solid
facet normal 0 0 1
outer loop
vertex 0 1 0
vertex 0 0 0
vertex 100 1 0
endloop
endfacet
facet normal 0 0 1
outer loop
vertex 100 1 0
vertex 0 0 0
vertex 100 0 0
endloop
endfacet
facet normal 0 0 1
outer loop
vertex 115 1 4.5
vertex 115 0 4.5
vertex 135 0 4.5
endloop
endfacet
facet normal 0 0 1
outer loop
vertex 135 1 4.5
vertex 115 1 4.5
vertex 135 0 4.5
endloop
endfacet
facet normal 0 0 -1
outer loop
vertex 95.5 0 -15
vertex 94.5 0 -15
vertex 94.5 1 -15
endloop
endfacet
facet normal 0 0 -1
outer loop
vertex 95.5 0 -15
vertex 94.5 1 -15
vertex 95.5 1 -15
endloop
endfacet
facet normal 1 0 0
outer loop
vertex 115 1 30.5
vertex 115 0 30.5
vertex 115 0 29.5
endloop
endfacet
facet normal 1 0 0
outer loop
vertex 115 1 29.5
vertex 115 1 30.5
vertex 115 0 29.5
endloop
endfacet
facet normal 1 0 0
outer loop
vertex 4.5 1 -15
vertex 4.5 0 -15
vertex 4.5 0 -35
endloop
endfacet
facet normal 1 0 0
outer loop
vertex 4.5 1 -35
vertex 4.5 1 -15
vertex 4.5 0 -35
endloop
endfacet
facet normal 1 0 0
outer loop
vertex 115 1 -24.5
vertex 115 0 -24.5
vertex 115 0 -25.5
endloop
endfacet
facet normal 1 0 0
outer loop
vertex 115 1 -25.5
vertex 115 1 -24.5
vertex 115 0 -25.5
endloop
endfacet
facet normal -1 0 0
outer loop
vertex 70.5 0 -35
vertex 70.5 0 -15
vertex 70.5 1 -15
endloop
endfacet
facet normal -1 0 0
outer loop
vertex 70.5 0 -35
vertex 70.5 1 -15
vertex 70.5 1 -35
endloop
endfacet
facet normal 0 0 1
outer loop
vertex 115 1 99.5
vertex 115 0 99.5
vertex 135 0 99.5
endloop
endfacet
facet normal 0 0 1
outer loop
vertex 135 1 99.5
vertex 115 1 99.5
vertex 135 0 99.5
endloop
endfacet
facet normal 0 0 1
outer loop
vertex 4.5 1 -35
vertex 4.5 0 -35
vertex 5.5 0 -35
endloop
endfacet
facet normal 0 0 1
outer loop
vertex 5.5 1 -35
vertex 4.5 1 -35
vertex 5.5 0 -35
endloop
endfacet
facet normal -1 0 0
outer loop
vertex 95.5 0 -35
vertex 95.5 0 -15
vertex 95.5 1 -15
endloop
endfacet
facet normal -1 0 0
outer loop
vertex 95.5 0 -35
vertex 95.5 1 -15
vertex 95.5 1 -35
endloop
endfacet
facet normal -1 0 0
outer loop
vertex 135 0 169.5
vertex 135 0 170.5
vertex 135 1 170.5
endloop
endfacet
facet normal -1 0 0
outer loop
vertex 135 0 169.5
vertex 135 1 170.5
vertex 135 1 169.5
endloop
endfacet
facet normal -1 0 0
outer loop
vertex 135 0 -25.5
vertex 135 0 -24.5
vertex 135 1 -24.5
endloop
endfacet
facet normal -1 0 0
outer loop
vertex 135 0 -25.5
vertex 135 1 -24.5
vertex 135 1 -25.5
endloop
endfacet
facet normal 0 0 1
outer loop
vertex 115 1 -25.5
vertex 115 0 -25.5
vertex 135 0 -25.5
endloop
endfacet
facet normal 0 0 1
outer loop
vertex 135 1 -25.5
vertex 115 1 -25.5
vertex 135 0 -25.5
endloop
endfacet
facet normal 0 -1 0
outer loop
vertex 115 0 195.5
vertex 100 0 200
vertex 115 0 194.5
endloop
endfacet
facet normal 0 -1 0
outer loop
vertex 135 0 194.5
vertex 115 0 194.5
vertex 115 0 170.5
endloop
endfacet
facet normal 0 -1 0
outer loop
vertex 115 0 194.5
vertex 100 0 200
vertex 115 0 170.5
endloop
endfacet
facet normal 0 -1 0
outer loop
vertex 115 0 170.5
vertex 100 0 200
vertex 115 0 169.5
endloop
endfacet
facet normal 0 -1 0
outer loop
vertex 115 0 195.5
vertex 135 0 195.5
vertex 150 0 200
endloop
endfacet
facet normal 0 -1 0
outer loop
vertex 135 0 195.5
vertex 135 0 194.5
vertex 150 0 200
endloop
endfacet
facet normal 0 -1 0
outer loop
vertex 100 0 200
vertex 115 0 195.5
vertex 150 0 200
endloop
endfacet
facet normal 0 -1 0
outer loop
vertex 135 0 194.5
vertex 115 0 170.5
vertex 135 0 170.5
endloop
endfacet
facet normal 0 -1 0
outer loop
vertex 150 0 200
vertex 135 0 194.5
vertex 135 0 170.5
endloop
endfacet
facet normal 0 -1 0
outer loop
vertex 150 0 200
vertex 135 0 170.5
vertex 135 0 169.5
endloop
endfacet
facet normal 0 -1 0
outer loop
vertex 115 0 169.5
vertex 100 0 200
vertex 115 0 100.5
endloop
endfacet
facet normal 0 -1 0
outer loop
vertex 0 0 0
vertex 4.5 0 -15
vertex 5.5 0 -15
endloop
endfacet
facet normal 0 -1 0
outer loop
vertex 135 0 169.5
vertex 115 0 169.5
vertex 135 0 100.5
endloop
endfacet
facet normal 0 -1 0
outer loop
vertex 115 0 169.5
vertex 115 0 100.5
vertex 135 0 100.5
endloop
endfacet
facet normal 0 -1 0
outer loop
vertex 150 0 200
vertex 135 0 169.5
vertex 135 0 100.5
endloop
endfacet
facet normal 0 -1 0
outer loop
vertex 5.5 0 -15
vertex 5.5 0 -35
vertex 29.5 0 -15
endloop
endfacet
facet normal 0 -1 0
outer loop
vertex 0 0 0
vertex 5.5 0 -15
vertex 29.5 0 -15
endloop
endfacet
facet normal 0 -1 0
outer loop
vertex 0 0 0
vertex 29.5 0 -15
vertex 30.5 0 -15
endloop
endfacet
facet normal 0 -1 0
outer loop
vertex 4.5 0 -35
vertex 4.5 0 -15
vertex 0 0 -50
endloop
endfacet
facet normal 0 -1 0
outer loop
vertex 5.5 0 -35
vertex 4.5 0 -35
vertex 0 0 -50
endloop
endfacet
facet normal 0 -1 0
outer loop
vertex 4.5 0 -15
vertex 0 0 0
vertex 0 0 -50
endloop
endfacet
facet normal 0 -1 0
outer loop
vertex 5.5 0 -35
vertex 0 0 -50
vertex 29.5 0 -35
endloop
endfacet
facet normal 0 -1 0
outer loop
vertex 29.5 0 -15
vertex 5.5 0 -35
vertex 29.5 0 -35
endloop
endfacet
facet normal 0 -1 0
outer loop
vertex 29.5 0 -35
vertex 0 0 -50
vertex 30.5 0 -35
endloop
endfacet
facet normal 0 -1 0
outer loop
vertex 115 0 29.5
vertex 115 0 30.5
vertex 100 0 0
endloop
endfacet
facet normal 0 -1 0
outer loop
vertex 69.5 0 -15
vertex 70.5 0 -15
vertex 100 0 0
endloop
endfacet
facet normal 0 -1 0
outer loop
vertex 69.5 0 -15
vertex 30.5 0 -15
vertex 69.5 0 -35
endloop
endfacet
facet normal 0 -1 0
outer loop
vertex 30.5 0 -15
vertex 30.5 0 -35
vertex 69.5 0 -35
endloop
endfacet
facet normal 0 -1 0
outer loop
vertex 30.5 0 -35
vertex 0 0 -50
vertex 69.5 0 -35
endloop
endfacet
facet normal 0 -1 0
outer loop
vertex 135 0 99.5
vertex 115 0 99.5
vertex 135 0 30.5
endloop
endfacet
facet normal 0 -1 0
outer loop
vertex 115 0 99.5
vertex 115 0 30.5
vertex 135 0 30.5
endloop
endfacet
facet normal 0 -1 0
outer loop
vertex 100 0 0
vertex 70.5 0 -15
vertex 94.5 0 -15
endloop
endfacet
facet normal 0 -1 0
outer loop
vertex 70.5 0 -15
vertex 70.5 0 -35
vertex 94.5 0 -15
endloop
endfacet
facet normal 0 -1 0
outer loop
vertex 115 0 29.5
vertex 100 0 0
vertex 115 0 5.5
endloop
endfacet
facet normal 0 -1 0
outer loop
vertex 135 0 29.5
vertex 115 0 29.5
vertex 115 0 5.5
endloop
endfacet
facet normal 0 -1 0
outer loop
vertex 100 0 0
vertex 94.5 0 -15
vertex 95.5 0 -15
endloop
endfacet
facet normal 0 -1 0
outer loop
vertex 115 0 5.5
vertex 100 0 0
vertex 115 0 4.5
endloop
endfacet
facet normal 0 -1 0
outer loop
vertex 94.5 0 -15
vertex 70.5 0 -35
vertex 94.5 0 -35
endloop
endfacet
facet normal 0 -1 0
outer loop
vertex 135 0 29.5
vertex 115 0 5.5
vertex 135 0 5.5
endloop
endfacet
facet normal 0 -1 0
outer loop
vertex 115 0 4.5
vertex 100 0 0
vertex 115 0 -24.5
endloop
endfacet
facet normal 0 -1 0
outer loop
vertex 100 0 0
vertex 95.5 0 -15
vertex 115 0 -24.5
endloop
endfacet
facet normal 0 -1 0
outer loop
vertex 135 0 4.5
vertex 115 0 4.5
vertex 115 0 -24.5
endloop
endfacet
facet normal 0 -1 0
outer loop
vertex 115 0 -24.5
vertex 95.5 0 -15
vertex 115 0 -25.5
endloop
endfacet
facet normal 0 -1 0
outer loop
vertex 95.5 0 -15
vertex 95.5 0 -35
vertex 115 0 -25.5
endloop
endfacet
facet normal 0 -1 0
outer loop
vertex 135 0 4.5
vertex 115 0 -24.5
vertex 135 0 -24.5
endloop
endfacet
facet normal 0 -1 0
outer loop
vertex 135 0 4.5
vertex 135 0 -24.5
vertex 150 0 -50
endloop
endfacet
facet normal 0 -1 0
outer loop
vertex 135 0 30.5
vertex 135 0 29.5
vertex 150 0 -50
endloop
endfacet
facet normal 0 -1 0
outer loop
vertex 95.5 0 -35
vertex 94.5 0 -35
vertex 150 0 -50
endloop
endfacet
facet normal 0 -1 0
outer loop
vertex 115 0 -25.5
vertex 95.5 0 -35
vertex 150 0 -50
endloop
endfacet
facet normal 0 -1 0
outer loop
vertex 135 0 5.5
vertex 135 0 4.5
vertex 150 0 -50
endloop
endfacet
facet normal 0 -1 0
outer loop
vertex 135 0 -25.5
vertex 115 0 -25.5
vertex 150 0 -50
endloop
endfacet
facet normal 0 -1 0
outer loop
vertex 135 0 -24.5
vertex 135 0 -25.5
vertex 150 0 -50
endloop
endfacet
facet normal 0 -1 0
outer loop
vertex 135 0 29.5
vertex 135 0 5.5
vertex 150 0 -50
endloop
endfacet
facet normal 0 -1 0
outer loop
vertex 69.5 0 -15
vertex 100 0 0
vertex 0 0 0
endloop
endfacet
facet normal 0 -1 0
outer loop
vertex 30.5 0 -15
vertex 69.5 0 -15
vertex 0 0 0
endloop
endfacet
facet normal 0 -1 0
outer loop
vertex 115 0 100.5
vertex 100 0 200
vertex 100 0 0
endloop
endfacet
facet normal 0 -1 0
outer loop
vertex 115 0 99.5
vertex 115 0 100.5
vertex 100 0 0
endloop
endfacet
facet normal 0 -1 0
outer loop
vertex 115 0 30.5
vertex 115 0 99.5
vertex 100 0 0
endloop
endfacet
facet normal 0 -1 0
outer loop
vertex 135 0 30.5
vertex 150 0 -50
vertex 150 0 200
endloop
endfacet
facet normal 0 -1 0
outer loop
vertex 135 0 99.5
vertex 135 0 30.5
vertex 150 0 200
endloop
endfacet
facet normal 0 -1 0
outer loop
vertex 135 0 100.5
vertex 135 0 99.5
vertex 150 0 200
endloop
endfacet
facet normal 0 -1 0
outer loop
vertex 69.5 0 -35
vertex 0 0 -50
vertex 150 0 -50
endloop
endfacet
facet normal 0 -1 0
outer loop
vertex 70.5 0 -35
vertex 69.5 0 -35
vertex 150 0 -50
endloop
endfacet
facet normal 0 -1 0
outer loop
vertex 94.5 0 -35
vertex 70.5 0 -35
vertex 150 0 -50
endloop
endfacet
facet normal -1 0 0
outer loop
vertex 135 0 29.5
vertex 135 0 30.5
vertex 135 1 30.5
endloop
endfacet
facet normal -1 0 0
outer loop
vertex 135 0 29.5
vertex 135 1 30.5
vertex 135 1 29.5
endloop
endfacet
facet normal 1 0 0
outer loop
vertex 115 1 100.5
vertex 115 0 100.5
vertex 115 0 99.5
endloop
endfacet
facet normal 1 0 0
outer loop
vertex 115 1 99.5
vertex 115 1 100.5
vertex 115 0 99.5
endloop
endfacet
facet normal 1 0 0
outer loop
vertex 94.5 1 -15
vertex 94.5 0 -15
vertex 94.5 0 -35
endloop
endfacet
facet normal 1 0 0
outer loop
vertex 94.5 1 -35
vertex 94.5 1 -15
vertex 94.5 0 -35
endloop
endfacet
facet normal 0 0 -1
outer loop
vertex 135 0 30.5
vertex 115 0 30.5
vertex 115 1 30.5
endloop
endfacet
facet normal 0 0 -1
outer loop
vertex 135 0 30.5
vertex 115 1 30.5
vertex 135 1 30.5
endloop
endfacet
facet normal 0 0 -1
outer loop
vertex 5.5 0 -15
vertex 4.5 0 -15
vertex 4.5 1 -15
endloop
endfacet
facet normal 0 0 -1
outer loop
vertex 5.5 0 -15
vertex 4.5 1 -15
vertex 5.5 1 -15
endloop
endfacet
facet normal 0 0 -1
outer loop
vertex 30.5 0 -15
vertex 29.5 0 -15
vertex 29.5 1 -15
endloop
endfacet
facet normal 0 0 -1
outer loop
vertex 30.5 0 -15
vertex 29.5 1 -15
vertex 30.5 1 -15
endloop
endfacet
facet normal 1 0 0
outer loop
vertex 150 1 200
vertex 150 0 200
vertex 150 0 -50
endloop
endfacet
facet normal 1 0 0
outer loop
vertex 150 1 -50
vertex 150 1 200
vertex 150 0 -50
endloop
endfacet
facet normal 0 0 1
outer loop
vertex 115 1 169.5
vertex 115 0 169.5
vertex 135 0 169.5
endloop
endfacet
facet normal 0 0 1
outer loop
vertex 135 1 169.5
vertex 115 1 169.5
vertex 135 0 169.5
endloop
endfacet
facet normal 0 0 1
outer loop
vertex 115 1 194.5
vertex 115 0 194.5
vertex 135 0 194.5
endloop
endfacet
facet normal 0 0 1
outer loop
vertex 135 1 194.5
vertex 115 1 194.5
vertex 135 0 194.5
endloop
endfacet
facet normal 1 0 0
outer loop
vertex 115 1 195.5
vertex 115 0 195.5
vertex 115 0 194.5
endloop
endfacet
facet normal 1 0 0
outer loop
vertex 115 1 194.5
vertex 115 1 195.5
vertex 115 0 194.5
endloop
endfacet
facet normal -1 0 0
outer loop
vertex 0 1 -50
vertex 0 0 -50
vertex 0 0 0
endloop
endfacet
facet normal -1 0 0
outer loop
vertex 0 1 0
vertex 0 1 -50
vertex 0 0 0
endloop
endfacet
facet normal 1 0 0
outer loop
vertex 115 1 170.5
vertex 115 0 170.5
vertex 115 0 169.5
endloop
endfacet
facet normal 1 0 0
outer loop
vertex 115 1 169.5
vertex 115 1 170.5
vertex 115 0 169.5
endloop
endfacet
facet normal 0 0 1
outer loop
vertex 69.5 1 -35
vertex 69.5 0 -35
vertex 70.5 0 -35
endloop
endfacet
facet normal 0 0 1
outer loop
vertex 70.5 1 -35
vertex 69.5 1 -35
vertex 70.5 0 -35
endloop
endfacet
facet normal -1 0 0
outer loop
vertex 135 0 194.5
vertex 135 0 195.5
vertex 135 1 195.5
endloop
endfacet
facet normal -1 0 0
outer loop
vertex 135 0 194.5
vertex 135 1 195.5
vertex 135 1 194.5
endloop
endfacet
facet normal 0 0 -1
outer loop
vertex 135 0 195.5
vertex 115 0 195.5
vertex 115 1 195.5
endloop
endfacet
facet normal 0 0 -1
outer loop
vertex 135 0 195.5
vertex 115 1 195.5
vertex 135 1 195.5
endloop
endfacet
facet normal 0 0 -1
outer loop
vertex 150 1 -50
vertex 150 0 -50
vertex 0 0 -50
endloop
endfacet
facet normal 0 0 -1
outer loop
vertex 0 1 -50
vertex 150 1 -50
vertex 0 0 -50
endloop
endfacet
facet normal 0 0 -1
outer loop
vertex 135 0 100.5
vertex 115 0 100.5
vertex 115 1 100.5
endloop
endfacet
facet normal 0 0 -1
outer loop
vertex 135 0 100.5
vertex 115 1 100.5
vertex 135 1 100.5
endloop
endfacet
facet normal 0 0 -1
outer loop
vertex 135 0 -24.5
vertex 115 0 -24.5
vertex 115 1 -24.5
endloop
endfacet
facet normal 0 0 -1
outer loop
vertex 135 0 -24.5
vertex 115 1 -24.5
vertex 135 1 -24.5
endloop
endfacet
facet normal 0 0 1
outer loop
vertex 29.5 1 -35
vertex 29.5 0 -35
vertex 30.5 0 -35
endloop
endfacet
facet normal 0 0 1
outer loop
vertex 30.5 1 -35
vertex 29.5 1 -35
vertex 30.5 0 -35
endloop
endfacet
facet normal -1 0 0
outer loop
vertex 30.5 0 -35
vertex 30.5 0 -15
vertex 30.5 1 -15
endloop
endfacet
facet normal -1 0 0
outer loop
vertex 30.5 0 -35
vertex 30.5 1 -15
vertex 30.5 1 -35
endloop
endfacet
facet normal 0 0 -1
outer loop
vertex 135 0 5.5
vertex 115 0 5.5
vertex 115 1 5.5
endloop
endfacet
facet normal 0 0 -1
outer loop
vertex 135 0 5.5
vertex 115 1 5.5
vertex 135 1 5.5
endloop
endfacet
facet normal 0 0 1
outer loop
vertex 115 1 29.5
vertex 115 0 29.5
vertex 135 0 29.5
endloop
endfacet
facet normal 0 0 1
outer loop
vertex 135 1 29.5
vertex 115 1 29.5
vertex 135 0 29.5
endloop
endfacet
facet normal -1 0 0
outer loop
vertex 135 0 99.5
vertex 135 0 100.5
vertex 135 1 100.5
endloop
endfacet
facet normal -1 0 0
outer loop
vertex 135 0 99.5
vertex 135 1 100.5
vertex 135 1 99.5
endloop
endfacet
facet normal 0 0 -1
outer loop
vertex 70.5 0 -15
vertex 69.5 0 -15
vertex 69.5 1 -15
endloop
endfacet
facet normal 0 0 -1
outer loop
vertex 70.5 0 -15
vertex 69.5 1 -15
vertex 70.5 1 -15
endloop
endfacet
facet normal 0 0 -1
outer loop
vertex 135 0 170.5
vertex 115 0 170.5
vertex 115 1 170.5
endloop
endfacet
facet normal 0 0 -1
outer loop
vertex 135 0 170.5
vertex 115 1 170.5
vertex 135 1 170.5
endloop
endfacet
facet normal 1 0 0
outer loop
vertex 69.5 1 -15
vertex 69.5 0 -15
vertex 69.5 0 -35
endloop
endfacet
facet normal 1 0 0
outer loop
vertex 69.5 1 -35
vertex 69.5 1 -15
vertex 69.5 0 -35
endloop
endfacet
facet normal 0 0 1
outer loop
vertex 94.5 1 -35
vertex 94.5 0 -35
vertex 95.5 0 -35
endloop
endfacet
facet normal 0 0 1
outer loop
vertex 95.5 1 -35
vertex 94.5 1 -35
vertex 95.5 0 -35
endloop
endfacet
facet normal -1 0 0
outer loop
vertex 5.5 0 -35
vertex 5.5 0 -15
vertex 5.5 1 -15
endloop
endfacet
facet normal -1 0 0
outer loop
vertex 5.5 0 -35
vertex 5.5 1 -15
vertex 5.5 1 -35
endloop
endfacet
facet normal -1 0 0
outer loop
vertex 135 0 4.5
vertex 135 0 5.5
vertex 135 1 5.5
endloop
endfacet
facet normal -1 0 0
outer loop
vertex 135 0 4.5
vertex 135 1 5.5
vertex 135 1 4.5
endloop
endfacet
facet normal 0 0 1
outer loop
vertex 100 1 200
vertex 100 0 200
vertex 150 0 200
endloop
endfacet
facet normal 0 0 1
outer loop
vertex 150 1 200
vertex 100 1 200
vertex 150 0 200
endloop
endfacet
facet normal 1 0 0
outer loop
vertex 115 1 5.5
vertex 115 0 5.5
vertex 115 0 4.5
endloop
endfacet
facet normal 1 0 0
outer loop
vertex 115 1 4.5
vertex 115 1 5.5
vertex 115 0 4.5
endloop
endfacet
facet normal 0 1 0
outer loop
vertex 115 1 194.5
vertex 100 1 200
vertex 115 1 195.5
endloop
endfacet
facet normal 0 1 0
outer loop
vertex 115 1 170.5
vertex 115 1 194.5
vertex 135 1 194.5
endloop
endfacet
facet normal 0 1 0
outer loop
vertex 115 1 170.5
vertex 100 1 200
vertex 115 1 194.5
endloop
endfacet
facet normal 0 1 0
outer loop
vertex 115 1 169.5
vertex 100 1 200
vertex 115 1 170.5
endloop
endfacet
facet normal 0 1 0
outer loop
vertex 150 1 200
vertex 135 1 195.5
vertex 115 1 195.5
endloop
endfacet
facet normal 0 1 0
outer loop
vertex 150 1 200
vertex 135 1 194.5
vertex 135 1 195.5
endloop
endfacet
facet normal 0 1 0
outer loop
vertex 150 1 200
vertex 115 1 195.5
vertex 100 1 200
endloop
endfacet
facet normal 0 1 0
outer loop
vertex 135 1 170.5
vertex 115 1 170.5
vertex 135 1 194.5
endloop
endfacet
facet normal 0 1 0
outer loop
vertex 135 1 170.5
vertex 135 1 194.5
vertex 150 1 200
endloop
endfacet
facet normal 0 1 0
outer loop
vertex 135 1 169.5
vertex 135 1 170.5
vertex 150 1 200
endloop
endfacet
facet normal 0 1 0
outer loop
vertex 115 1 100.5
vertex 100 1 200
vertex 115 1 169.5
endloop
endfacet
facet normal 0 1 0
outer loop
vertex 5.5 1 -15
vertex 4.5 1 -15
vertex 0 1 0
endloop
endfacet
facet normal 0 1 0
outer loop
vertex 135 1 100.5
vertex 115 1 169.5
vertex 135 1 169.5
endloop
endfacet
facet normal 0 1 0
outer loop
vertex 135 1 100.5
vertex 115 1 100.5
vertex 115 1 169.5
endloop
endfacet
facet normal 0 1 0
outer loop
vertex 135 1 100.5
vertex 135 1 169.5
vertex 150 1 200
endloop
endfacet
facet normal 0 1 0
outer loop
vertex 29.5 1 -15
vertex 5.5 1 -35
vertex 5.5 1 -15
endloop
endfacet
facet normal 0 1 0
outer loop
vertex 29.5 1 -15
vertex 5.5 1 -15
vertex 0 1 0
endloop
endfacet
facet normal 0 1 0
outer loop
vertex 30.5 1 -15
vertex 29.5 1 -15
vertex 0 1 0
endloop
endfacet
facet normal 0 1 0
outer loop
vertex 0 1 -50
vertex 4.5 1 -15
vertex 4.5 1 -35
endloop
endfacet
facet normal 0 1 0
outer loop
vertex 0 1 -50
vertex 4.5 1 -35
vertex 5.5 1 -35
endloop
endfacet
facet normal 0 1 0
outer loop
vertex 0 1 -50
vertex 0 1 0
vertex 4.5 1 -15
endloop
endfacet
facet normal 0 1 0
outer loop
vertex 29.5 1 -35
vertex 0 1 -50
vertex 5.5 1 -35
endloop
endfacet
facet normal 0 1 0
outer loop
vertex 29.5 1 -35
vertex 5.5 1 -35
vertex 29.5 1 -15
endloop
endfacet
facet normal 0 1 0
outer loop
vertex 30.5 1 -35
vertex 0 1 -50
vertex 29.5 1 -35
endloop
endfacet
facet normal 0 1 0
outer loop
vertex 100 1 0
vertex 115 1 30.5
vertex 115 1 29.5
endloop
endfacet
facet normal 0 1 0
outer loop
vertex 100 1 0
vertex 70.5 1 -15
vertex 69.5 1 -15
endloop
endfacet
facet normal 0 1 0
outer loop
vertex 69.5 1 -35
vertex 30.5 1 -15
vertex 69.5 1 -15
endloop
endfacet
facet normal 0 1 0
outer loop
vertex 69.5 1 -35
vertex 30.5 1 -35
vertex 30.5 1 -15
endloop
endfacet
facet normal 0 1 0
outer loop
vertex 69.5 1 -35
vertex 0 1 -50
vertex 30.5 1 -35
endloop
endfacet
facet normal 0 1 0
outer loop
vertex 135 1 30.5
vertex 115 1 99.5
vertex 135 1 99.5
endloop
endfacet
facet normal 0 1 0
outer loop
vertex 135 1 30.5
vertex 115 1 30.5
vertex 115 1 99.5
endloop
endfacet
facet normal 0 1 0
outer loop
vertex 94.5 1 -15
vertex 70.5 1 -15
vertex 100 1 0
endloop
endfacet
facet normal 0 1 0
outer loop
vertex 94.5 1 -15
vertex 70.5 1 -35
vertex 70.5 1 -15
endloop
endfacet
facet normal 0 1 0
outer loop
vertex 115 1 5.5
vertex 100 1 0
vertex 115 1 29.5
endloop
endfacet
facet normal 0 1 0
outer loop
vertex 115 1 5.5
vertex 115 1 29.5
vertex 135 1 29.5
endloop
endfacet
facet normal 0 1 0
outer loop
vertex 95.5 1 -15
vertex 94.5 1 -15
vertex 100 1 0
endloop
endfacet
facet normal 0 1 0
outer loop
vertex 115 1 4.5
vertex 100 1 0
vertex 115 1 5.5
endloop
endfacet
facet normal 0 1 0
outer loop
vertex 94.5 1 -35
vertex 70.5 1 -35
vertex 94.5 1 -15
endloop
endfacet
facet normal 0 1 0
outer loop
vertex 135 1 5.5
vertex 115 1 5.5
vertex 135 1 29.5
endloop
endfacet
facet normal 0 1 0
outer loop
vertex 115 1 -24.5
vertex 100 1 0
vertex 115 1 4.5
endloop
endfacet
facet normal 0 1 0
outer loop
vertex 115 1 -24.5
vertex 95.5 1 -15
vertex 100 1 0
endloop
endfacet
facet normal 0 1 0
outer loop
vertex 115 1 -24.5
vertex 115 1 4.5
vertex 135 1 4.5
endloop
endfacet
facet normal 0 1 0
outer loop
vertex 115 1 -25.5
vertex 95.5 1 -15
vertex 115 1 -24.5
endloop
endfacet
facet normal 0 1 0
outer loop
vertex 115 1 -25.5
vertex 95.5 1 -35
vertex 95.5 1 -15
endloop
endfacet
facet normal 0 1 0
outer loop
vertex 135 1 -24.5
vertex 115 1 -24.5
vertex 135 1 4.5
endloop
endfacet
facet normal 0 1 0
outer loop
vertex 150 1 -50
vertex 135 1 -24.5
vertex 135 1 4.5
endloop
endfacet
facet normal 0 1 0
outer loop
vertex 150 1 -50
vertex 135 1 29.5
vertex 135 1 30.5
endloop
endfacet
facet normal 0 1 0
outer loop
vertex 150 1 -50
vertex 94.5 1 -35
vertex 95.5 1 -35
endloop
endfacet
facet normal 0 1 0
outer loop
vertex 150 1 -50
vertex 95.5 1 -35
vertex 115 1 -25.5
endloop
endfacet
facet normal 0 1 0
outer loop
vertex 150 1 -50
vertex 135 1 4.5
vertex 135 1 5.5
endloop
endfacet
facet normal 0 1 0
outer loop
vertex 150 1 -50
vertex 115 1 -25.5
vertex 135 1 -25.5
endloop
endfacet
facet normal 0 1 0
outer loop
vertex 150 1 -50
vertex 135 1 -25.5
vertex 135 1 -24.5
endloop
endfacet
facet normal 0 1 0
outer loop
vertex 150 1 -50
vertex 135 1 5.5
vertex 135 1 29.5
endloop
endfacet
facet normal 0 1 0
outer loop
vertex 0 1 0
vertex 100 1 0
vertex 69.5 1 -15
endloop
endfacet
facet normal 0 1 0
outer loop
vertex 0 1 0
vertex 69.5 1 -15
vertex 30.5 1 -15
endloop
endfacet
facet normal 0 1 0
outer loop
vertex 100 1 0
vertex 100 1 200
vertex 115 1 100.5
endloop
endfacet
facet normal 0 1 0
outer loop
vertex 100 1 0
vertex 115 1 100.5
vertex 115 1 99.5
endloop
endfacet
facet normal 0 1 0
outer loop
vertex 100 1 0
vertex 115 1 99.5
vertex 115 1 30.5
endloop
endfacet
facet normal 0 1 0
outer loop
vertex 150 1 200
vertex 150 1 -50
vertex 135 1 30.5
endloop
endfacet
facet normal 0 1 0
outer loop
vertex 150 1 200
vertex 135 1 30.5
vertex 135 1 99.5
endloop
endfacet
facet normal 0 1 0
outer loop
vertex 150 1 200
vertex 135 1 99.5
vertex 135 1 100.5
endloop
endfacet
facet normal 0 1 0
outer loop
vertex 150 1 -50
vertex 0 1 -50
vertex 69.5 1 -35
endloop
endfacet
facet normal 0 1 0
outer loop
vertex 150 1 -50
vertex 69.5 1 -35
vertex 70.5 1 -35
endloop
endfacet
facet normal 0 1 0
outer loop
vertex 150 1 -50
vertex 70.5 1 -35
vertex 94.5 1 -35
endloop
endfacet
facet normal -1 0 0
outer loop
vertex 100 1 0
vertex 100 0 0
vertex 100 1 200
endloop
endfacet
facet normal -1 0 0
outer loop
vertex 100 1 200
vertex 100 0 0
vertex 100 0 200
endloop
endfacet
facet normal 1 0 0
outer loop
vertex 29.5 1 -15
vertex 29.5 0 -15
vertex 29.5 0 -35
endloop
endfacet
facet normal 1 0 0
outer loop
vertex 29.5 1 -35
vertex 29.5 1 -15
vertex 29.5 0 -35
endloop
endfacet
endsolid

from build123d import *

# Parameters (mm, degrees)
SKETCH1_W           = 1
SKETCH1_H           = 20
SKETCH1_W_2         = 20
SKETCH1_H_2         = 1
BOSS_EXTRUDE1_DEPTH = 1


with BuildPart() as part:
    # Sketch1 → Boss-Extrude1 (new body)
    with BuildSketch(Plane(origin=(0, 0, 0), x_dir=(1, 0, 0), z_dir=(0, 1, 0))):
        Polygon((0, 0), (100, 0), (100, -200), (150, -200), (150, 50), (0, 50), align=None)
        with Locations((5, 25)):
            Rectangle(SKETCH1_W, SKETCH1_H, mode=Mode.SUBTRACT)
        with Locations((30, 25)):
            Rectangle(SKETCH1_W, SKETCH1_H, mode=Mode.SUBTRACT)
        with Locations((95, 25)):
            Rectangle(SKETCH1_W, SKETCH1_H, mode=Mode.SUBTRACT)
        with Locations((125, -5)):
            Rectangle(SKETCH1_W_2, SKETCH1_H_2, mode=Mode.SUBTRACT)
        with Locations((125, -30)):
            Rectangle(SKETCH1_W_2, SKETCH1_H_2, mode=Mode.SUBTRACT)
        with Locations((125, -100)):
            Rectangle(SKETCH1_W_2, SKETCH1_H_2, mode=Mode.SUBTRACT)
        with Locations((125, -195)):
            Rectangle(SKETCH1_W_2, SKETCH1_H_2, mode=Mode.SUBTRACT)
        with Locations((125, -170)):
            Rectangle(SKETCH1_W_2, SKETCH1_H_2, mode=Mode.SUBTRACT)
        with Locations((125, 25)):
            Rectangle(SKETCH1_W_2, SKETCH1_H_2, mode=Mode.SUBTRACT)
        with Locations((70, 25)):
            Rectangle(SKETCH1_W, SKETCH1_H, mode=Mode.SUBTRACT)
    extrude(amount=BOSS_EXTRUDE1_DEPTH)


solid = part.part
